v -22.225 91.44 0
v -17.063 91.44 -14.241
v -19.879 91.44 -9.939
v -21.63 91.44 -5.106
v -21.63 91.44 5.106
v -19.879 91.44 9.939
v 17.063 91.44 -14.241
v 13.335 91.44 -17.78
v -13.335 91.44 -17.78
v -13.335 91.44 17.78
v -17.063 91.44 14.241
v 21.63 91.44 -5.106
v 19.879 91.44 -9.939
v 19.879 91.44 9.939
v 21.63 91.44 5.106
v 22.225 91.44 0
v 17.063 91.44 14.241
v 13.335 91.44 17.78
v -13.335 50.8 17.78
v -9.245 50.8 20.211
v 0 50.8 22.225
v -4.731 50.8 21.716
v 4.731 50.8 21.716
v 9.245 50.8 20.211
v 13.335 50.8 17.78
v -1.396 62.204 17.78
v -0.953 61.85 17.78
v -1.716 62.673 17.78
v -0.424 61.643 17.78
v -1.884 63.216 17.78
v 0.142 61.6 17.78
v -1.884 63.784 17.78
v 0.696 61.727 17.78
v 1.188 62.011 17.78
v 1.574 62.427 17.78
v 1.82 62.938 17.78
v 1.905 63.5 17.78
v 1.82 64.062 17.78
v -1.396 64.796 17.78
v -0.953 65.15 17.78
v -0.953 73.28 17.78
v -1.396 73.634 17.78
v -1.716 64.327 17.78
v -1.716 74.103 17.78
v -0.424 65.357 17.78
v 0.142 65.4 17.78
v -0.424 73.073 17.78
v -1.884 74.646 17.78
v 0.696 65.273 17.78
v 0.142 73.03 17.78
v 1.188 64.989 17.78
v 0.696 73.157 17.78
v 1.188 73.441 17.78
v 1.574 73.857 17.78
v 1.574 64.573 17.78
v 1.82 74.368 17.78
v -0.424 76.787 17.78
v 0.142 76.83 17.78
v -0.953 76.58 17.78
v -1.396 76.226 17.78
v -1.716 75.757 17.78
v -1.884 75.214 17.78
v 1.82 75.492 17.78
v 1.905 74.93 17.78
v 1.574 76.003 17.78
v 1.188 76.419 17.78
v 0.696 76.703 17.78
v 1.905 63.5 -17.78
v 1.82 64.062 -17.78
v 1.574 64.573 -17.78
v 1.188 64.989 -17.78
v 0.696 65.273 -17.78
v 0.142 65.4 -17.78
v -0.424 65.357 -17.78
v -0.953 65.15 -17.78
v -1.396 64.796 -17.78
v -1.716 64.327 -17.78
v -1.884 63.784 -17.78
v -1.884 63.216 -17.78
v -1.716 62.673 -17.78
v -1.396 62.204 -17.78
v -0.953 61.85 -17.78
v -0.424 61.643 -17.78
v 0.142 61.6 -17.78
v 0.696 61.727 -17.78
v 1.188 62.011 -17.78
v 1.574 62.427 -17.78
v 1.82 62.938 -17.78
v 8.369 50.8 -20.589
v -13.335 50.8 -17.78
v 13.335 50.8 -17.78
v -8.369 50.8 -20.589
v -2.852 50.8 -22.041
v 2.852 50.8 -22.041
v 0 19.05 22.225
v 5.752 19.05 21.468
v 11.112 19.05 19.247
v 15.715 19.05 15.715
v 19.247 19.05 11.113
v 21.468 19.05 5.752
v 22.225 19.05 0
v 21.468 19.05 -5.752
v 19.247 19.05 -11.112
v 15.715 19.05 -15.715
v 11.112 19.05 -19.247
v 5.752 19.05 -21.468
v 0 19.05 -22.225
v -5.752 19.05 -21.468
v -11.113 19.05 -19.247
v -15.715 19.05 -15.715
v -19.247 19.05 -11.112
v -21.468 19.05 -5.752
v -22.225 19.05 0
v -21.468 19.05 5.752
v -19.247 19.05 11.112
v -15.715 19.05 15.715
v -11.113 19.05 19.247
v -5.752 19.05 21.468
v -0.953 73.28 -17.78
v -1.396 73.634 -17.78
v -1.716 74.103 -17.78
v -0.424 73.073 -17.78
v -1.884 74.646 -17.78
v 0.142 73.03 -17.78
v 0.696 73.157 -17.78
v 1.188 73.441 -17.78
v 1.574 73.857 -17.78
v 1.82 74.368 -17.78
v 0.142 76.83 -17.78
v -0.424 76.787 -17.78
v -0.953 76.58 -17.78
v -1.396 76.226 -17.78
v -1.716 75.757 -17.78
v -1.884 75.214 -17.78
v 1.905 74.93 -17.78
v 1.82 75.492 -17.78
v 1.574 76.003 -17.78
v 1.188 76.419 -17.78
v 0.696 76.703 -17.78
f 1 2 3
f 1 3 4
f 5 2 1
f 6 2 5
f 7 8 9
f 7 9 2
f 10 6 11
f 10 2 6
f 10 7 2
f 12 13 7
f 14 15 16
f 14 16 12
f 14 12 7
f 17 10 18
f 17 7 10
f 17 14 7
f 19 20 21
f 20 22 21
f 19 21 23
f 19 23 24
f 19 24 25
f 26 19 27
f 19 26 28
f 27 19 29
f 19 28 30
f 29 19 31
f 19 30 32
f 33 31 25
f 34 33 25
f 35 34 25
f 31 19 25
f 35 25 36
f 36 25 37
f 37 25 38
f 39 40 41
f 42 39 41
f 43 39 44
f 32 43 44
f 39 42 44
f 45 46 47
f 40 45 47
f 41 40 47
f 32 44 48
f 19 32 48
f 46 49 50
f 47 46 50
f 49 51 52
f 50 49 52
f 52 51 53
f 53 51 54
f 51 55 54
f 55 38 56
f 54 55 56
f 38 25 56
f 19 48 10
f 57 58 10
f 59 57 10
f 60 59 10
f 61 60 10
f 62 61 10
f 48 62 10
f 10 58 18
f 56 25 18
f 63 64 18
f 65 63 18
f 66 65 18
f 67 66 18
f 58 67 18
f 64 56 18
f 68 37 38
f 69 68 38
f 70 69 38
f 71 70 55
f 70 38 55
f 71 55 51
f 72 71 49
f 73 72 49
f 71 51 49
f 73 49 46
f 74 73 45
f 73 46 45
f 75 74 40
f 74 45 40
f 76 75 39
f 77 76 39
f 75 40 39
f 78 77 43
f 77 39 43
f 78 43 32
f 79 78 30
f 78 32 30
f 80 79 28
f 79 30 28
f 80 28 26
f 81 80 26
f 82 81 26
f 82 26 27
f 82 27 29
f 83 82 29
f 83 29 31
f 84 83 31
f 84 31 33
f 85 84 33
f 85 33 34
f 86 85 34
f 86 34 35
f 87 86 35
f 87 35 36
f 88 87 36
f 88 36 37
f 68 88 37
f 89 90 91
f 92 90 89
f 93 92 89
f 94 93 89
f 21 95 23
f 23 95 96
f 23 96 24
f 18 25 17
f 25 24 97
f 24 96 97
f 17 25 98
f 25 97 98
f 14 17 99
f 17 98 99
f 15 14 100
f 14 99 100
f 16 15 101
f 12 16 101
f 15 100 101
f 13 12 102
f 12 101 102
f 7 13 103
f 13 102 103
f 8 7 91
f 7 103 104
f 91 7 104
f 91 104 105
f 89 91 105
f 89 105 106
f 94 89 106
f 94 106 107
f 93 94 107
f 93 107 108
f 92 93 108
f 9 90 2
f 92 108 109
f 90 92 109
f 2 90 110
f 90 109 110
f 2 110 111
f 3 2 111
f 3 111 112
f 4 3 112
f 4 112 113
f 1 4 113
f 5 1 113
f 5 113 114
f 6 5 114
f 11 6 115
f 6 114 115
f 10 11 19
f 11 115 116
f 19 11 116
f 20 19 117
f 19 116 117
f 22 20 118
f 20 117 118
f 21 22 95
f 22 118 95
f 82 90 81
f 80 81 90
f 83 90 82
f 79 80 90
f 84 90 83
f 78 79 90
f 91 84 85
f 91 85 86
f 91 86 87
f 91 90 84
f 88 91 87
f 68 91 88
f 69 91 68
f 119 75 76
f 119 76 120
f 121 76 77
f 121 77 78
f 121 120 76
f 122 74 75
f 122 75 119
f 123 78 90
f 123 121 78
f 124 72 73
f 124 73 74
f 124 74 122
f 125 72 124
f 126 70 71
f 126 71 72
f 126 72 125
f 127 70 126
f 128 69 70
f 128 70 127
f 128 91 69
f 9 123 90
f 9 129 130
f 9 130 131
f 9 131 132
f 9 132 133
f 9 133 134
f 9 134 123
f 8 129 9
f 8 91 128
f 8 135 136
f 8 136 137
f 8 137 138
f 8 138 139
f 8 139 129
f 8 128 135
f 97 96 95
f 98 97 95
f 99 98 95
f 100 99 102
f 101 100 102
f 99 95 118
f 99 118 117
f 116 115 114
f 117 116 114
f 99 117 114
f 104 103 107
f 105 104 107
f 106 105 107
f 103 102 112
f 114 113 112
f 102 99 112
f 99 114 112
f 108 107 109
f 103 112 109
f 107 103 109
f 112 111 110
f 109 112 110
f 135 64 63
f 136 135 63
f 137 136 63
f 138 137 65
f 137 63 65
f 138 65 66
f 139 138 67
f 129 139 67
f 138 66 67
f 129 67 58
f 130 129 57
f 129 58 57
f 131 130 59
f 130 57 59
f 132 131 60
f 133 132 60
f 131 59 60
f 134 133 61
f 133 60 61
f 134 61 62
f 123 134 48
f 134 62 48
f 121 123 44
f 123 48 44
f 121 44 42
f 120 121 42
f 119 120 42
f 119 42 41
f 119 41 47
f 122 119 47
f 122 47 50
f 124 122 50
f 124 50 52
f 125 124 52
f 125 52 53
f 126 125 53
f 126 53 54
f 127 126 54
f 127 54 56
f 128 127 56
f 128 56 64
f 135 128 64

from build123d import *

# Parameters (mm, degrees)
SKETCH1_R           = 22.225
BOSS_EXTRUDE1_DEPTH = 91.44
CUT_EXTRUDE1_REACH  = 106.072
SKETCH2_W           = 4.445
SKETCH2_H           = 40.64
SKETCH4_R           = 1.905
CUT_EXTRUDE2_DEPTH  = 103.252746907
SKETCH6_W           = 44.45
SKETCH6_H           = 19.05
CUT_EXTRUDE3_DEPTH  = 685.739656498


with BuildPart() as part:
    # Sketch1 → Boss-Extrude1 (new body)
    with BuildSketch(Plane(origin=(0, 0, 0), x_dir=(1, 0, 0), z_dir=(0, 1, 0))):
        with Locations(Location((0, 0, 0), (0, 0, 270))):
            Circle(SKETCH1_R)
    extrude(amount=BOSS_EXTRUDE1_DEPTH)

    # Sketch2 → Cut-Extrude1 (cut, up to next)
    with BuildSketch(Plane(origin=(22.225, 0, 0), x_dir=(0, 0, -1), z_dir=(1, 0, 0)), mode=Mode.PRIVATE) as cut_extrude1_sk1:
        with Locations((-20.0025, 71.12)):
            Rectangle(SKETCH2_W, SKETCH2_H)
    cut_extrude1_tool1 = extrude(cut_extrude1_sk1.sketch, amount=-CUT_EXTRUDE1_REACH, mode=Mode.PRIVATE) & part.part
    # Sketch2 → Cut-Extrude1 (cut, up to next)
    with BuildSketch(Plane(origin=(22.225, 0, 0), x_dir=(0, 0, -1), z_dir=(1, 0, 0)), mode=Mode.PRIVATE) as cut_extrude1_sk2:
        with Locations((20.0025, 71.12)):
            Rectangle(SKETCH2_W, SKETCH2_H)
    cut_extrude1_tool2 = extrude(cut_extrude1_sk2.sketch, amount=-CUT_EXTRUDE1_REACH, mode=Mode.PRIVATE) & part.part
    add(cut_extrude1_tool1.solids().sort_by_distance((22.225, 71.12, 20.0025))[0], mode=Mode.SUBTRACT)
    add(cut_extrude1_tool2.solids().sort_by_distance((22.225, 71.12, -20.0025))[0], mode=Mode.SUBTRACT)

    # Sketch4 → Cut-Extrude2 (cut, through all)
    with BuildSketch(Plane.XY.offset(17.78)):
        with Locations((0, 74.93)):
            Circle(SKETCH4_R)
        with Locations((0, 63.5)):
            Circle(SKETCH4_R)
    extrude(amount=-CUT_EXTRUDE2_DEPTH, mode=Mode.SUBTRACT)

    # Sketch6 → Cut-Extrude3 (cut, through all)
    with BuildSketch(Plane(origin=(-69.793368373, -6.35, 649.219810065), x_dir=(0, 0, -1), z_dir=(1, 0, 0))):
        with Locations((649.219810065, 15.875)):
            Rectangle(SKETCH6_W, SKETCH6_H)
    extrude(amount=CUT_EXTRUDE3_DEPTH, mode=Mode.SUBTRACT)


solid = part.part
